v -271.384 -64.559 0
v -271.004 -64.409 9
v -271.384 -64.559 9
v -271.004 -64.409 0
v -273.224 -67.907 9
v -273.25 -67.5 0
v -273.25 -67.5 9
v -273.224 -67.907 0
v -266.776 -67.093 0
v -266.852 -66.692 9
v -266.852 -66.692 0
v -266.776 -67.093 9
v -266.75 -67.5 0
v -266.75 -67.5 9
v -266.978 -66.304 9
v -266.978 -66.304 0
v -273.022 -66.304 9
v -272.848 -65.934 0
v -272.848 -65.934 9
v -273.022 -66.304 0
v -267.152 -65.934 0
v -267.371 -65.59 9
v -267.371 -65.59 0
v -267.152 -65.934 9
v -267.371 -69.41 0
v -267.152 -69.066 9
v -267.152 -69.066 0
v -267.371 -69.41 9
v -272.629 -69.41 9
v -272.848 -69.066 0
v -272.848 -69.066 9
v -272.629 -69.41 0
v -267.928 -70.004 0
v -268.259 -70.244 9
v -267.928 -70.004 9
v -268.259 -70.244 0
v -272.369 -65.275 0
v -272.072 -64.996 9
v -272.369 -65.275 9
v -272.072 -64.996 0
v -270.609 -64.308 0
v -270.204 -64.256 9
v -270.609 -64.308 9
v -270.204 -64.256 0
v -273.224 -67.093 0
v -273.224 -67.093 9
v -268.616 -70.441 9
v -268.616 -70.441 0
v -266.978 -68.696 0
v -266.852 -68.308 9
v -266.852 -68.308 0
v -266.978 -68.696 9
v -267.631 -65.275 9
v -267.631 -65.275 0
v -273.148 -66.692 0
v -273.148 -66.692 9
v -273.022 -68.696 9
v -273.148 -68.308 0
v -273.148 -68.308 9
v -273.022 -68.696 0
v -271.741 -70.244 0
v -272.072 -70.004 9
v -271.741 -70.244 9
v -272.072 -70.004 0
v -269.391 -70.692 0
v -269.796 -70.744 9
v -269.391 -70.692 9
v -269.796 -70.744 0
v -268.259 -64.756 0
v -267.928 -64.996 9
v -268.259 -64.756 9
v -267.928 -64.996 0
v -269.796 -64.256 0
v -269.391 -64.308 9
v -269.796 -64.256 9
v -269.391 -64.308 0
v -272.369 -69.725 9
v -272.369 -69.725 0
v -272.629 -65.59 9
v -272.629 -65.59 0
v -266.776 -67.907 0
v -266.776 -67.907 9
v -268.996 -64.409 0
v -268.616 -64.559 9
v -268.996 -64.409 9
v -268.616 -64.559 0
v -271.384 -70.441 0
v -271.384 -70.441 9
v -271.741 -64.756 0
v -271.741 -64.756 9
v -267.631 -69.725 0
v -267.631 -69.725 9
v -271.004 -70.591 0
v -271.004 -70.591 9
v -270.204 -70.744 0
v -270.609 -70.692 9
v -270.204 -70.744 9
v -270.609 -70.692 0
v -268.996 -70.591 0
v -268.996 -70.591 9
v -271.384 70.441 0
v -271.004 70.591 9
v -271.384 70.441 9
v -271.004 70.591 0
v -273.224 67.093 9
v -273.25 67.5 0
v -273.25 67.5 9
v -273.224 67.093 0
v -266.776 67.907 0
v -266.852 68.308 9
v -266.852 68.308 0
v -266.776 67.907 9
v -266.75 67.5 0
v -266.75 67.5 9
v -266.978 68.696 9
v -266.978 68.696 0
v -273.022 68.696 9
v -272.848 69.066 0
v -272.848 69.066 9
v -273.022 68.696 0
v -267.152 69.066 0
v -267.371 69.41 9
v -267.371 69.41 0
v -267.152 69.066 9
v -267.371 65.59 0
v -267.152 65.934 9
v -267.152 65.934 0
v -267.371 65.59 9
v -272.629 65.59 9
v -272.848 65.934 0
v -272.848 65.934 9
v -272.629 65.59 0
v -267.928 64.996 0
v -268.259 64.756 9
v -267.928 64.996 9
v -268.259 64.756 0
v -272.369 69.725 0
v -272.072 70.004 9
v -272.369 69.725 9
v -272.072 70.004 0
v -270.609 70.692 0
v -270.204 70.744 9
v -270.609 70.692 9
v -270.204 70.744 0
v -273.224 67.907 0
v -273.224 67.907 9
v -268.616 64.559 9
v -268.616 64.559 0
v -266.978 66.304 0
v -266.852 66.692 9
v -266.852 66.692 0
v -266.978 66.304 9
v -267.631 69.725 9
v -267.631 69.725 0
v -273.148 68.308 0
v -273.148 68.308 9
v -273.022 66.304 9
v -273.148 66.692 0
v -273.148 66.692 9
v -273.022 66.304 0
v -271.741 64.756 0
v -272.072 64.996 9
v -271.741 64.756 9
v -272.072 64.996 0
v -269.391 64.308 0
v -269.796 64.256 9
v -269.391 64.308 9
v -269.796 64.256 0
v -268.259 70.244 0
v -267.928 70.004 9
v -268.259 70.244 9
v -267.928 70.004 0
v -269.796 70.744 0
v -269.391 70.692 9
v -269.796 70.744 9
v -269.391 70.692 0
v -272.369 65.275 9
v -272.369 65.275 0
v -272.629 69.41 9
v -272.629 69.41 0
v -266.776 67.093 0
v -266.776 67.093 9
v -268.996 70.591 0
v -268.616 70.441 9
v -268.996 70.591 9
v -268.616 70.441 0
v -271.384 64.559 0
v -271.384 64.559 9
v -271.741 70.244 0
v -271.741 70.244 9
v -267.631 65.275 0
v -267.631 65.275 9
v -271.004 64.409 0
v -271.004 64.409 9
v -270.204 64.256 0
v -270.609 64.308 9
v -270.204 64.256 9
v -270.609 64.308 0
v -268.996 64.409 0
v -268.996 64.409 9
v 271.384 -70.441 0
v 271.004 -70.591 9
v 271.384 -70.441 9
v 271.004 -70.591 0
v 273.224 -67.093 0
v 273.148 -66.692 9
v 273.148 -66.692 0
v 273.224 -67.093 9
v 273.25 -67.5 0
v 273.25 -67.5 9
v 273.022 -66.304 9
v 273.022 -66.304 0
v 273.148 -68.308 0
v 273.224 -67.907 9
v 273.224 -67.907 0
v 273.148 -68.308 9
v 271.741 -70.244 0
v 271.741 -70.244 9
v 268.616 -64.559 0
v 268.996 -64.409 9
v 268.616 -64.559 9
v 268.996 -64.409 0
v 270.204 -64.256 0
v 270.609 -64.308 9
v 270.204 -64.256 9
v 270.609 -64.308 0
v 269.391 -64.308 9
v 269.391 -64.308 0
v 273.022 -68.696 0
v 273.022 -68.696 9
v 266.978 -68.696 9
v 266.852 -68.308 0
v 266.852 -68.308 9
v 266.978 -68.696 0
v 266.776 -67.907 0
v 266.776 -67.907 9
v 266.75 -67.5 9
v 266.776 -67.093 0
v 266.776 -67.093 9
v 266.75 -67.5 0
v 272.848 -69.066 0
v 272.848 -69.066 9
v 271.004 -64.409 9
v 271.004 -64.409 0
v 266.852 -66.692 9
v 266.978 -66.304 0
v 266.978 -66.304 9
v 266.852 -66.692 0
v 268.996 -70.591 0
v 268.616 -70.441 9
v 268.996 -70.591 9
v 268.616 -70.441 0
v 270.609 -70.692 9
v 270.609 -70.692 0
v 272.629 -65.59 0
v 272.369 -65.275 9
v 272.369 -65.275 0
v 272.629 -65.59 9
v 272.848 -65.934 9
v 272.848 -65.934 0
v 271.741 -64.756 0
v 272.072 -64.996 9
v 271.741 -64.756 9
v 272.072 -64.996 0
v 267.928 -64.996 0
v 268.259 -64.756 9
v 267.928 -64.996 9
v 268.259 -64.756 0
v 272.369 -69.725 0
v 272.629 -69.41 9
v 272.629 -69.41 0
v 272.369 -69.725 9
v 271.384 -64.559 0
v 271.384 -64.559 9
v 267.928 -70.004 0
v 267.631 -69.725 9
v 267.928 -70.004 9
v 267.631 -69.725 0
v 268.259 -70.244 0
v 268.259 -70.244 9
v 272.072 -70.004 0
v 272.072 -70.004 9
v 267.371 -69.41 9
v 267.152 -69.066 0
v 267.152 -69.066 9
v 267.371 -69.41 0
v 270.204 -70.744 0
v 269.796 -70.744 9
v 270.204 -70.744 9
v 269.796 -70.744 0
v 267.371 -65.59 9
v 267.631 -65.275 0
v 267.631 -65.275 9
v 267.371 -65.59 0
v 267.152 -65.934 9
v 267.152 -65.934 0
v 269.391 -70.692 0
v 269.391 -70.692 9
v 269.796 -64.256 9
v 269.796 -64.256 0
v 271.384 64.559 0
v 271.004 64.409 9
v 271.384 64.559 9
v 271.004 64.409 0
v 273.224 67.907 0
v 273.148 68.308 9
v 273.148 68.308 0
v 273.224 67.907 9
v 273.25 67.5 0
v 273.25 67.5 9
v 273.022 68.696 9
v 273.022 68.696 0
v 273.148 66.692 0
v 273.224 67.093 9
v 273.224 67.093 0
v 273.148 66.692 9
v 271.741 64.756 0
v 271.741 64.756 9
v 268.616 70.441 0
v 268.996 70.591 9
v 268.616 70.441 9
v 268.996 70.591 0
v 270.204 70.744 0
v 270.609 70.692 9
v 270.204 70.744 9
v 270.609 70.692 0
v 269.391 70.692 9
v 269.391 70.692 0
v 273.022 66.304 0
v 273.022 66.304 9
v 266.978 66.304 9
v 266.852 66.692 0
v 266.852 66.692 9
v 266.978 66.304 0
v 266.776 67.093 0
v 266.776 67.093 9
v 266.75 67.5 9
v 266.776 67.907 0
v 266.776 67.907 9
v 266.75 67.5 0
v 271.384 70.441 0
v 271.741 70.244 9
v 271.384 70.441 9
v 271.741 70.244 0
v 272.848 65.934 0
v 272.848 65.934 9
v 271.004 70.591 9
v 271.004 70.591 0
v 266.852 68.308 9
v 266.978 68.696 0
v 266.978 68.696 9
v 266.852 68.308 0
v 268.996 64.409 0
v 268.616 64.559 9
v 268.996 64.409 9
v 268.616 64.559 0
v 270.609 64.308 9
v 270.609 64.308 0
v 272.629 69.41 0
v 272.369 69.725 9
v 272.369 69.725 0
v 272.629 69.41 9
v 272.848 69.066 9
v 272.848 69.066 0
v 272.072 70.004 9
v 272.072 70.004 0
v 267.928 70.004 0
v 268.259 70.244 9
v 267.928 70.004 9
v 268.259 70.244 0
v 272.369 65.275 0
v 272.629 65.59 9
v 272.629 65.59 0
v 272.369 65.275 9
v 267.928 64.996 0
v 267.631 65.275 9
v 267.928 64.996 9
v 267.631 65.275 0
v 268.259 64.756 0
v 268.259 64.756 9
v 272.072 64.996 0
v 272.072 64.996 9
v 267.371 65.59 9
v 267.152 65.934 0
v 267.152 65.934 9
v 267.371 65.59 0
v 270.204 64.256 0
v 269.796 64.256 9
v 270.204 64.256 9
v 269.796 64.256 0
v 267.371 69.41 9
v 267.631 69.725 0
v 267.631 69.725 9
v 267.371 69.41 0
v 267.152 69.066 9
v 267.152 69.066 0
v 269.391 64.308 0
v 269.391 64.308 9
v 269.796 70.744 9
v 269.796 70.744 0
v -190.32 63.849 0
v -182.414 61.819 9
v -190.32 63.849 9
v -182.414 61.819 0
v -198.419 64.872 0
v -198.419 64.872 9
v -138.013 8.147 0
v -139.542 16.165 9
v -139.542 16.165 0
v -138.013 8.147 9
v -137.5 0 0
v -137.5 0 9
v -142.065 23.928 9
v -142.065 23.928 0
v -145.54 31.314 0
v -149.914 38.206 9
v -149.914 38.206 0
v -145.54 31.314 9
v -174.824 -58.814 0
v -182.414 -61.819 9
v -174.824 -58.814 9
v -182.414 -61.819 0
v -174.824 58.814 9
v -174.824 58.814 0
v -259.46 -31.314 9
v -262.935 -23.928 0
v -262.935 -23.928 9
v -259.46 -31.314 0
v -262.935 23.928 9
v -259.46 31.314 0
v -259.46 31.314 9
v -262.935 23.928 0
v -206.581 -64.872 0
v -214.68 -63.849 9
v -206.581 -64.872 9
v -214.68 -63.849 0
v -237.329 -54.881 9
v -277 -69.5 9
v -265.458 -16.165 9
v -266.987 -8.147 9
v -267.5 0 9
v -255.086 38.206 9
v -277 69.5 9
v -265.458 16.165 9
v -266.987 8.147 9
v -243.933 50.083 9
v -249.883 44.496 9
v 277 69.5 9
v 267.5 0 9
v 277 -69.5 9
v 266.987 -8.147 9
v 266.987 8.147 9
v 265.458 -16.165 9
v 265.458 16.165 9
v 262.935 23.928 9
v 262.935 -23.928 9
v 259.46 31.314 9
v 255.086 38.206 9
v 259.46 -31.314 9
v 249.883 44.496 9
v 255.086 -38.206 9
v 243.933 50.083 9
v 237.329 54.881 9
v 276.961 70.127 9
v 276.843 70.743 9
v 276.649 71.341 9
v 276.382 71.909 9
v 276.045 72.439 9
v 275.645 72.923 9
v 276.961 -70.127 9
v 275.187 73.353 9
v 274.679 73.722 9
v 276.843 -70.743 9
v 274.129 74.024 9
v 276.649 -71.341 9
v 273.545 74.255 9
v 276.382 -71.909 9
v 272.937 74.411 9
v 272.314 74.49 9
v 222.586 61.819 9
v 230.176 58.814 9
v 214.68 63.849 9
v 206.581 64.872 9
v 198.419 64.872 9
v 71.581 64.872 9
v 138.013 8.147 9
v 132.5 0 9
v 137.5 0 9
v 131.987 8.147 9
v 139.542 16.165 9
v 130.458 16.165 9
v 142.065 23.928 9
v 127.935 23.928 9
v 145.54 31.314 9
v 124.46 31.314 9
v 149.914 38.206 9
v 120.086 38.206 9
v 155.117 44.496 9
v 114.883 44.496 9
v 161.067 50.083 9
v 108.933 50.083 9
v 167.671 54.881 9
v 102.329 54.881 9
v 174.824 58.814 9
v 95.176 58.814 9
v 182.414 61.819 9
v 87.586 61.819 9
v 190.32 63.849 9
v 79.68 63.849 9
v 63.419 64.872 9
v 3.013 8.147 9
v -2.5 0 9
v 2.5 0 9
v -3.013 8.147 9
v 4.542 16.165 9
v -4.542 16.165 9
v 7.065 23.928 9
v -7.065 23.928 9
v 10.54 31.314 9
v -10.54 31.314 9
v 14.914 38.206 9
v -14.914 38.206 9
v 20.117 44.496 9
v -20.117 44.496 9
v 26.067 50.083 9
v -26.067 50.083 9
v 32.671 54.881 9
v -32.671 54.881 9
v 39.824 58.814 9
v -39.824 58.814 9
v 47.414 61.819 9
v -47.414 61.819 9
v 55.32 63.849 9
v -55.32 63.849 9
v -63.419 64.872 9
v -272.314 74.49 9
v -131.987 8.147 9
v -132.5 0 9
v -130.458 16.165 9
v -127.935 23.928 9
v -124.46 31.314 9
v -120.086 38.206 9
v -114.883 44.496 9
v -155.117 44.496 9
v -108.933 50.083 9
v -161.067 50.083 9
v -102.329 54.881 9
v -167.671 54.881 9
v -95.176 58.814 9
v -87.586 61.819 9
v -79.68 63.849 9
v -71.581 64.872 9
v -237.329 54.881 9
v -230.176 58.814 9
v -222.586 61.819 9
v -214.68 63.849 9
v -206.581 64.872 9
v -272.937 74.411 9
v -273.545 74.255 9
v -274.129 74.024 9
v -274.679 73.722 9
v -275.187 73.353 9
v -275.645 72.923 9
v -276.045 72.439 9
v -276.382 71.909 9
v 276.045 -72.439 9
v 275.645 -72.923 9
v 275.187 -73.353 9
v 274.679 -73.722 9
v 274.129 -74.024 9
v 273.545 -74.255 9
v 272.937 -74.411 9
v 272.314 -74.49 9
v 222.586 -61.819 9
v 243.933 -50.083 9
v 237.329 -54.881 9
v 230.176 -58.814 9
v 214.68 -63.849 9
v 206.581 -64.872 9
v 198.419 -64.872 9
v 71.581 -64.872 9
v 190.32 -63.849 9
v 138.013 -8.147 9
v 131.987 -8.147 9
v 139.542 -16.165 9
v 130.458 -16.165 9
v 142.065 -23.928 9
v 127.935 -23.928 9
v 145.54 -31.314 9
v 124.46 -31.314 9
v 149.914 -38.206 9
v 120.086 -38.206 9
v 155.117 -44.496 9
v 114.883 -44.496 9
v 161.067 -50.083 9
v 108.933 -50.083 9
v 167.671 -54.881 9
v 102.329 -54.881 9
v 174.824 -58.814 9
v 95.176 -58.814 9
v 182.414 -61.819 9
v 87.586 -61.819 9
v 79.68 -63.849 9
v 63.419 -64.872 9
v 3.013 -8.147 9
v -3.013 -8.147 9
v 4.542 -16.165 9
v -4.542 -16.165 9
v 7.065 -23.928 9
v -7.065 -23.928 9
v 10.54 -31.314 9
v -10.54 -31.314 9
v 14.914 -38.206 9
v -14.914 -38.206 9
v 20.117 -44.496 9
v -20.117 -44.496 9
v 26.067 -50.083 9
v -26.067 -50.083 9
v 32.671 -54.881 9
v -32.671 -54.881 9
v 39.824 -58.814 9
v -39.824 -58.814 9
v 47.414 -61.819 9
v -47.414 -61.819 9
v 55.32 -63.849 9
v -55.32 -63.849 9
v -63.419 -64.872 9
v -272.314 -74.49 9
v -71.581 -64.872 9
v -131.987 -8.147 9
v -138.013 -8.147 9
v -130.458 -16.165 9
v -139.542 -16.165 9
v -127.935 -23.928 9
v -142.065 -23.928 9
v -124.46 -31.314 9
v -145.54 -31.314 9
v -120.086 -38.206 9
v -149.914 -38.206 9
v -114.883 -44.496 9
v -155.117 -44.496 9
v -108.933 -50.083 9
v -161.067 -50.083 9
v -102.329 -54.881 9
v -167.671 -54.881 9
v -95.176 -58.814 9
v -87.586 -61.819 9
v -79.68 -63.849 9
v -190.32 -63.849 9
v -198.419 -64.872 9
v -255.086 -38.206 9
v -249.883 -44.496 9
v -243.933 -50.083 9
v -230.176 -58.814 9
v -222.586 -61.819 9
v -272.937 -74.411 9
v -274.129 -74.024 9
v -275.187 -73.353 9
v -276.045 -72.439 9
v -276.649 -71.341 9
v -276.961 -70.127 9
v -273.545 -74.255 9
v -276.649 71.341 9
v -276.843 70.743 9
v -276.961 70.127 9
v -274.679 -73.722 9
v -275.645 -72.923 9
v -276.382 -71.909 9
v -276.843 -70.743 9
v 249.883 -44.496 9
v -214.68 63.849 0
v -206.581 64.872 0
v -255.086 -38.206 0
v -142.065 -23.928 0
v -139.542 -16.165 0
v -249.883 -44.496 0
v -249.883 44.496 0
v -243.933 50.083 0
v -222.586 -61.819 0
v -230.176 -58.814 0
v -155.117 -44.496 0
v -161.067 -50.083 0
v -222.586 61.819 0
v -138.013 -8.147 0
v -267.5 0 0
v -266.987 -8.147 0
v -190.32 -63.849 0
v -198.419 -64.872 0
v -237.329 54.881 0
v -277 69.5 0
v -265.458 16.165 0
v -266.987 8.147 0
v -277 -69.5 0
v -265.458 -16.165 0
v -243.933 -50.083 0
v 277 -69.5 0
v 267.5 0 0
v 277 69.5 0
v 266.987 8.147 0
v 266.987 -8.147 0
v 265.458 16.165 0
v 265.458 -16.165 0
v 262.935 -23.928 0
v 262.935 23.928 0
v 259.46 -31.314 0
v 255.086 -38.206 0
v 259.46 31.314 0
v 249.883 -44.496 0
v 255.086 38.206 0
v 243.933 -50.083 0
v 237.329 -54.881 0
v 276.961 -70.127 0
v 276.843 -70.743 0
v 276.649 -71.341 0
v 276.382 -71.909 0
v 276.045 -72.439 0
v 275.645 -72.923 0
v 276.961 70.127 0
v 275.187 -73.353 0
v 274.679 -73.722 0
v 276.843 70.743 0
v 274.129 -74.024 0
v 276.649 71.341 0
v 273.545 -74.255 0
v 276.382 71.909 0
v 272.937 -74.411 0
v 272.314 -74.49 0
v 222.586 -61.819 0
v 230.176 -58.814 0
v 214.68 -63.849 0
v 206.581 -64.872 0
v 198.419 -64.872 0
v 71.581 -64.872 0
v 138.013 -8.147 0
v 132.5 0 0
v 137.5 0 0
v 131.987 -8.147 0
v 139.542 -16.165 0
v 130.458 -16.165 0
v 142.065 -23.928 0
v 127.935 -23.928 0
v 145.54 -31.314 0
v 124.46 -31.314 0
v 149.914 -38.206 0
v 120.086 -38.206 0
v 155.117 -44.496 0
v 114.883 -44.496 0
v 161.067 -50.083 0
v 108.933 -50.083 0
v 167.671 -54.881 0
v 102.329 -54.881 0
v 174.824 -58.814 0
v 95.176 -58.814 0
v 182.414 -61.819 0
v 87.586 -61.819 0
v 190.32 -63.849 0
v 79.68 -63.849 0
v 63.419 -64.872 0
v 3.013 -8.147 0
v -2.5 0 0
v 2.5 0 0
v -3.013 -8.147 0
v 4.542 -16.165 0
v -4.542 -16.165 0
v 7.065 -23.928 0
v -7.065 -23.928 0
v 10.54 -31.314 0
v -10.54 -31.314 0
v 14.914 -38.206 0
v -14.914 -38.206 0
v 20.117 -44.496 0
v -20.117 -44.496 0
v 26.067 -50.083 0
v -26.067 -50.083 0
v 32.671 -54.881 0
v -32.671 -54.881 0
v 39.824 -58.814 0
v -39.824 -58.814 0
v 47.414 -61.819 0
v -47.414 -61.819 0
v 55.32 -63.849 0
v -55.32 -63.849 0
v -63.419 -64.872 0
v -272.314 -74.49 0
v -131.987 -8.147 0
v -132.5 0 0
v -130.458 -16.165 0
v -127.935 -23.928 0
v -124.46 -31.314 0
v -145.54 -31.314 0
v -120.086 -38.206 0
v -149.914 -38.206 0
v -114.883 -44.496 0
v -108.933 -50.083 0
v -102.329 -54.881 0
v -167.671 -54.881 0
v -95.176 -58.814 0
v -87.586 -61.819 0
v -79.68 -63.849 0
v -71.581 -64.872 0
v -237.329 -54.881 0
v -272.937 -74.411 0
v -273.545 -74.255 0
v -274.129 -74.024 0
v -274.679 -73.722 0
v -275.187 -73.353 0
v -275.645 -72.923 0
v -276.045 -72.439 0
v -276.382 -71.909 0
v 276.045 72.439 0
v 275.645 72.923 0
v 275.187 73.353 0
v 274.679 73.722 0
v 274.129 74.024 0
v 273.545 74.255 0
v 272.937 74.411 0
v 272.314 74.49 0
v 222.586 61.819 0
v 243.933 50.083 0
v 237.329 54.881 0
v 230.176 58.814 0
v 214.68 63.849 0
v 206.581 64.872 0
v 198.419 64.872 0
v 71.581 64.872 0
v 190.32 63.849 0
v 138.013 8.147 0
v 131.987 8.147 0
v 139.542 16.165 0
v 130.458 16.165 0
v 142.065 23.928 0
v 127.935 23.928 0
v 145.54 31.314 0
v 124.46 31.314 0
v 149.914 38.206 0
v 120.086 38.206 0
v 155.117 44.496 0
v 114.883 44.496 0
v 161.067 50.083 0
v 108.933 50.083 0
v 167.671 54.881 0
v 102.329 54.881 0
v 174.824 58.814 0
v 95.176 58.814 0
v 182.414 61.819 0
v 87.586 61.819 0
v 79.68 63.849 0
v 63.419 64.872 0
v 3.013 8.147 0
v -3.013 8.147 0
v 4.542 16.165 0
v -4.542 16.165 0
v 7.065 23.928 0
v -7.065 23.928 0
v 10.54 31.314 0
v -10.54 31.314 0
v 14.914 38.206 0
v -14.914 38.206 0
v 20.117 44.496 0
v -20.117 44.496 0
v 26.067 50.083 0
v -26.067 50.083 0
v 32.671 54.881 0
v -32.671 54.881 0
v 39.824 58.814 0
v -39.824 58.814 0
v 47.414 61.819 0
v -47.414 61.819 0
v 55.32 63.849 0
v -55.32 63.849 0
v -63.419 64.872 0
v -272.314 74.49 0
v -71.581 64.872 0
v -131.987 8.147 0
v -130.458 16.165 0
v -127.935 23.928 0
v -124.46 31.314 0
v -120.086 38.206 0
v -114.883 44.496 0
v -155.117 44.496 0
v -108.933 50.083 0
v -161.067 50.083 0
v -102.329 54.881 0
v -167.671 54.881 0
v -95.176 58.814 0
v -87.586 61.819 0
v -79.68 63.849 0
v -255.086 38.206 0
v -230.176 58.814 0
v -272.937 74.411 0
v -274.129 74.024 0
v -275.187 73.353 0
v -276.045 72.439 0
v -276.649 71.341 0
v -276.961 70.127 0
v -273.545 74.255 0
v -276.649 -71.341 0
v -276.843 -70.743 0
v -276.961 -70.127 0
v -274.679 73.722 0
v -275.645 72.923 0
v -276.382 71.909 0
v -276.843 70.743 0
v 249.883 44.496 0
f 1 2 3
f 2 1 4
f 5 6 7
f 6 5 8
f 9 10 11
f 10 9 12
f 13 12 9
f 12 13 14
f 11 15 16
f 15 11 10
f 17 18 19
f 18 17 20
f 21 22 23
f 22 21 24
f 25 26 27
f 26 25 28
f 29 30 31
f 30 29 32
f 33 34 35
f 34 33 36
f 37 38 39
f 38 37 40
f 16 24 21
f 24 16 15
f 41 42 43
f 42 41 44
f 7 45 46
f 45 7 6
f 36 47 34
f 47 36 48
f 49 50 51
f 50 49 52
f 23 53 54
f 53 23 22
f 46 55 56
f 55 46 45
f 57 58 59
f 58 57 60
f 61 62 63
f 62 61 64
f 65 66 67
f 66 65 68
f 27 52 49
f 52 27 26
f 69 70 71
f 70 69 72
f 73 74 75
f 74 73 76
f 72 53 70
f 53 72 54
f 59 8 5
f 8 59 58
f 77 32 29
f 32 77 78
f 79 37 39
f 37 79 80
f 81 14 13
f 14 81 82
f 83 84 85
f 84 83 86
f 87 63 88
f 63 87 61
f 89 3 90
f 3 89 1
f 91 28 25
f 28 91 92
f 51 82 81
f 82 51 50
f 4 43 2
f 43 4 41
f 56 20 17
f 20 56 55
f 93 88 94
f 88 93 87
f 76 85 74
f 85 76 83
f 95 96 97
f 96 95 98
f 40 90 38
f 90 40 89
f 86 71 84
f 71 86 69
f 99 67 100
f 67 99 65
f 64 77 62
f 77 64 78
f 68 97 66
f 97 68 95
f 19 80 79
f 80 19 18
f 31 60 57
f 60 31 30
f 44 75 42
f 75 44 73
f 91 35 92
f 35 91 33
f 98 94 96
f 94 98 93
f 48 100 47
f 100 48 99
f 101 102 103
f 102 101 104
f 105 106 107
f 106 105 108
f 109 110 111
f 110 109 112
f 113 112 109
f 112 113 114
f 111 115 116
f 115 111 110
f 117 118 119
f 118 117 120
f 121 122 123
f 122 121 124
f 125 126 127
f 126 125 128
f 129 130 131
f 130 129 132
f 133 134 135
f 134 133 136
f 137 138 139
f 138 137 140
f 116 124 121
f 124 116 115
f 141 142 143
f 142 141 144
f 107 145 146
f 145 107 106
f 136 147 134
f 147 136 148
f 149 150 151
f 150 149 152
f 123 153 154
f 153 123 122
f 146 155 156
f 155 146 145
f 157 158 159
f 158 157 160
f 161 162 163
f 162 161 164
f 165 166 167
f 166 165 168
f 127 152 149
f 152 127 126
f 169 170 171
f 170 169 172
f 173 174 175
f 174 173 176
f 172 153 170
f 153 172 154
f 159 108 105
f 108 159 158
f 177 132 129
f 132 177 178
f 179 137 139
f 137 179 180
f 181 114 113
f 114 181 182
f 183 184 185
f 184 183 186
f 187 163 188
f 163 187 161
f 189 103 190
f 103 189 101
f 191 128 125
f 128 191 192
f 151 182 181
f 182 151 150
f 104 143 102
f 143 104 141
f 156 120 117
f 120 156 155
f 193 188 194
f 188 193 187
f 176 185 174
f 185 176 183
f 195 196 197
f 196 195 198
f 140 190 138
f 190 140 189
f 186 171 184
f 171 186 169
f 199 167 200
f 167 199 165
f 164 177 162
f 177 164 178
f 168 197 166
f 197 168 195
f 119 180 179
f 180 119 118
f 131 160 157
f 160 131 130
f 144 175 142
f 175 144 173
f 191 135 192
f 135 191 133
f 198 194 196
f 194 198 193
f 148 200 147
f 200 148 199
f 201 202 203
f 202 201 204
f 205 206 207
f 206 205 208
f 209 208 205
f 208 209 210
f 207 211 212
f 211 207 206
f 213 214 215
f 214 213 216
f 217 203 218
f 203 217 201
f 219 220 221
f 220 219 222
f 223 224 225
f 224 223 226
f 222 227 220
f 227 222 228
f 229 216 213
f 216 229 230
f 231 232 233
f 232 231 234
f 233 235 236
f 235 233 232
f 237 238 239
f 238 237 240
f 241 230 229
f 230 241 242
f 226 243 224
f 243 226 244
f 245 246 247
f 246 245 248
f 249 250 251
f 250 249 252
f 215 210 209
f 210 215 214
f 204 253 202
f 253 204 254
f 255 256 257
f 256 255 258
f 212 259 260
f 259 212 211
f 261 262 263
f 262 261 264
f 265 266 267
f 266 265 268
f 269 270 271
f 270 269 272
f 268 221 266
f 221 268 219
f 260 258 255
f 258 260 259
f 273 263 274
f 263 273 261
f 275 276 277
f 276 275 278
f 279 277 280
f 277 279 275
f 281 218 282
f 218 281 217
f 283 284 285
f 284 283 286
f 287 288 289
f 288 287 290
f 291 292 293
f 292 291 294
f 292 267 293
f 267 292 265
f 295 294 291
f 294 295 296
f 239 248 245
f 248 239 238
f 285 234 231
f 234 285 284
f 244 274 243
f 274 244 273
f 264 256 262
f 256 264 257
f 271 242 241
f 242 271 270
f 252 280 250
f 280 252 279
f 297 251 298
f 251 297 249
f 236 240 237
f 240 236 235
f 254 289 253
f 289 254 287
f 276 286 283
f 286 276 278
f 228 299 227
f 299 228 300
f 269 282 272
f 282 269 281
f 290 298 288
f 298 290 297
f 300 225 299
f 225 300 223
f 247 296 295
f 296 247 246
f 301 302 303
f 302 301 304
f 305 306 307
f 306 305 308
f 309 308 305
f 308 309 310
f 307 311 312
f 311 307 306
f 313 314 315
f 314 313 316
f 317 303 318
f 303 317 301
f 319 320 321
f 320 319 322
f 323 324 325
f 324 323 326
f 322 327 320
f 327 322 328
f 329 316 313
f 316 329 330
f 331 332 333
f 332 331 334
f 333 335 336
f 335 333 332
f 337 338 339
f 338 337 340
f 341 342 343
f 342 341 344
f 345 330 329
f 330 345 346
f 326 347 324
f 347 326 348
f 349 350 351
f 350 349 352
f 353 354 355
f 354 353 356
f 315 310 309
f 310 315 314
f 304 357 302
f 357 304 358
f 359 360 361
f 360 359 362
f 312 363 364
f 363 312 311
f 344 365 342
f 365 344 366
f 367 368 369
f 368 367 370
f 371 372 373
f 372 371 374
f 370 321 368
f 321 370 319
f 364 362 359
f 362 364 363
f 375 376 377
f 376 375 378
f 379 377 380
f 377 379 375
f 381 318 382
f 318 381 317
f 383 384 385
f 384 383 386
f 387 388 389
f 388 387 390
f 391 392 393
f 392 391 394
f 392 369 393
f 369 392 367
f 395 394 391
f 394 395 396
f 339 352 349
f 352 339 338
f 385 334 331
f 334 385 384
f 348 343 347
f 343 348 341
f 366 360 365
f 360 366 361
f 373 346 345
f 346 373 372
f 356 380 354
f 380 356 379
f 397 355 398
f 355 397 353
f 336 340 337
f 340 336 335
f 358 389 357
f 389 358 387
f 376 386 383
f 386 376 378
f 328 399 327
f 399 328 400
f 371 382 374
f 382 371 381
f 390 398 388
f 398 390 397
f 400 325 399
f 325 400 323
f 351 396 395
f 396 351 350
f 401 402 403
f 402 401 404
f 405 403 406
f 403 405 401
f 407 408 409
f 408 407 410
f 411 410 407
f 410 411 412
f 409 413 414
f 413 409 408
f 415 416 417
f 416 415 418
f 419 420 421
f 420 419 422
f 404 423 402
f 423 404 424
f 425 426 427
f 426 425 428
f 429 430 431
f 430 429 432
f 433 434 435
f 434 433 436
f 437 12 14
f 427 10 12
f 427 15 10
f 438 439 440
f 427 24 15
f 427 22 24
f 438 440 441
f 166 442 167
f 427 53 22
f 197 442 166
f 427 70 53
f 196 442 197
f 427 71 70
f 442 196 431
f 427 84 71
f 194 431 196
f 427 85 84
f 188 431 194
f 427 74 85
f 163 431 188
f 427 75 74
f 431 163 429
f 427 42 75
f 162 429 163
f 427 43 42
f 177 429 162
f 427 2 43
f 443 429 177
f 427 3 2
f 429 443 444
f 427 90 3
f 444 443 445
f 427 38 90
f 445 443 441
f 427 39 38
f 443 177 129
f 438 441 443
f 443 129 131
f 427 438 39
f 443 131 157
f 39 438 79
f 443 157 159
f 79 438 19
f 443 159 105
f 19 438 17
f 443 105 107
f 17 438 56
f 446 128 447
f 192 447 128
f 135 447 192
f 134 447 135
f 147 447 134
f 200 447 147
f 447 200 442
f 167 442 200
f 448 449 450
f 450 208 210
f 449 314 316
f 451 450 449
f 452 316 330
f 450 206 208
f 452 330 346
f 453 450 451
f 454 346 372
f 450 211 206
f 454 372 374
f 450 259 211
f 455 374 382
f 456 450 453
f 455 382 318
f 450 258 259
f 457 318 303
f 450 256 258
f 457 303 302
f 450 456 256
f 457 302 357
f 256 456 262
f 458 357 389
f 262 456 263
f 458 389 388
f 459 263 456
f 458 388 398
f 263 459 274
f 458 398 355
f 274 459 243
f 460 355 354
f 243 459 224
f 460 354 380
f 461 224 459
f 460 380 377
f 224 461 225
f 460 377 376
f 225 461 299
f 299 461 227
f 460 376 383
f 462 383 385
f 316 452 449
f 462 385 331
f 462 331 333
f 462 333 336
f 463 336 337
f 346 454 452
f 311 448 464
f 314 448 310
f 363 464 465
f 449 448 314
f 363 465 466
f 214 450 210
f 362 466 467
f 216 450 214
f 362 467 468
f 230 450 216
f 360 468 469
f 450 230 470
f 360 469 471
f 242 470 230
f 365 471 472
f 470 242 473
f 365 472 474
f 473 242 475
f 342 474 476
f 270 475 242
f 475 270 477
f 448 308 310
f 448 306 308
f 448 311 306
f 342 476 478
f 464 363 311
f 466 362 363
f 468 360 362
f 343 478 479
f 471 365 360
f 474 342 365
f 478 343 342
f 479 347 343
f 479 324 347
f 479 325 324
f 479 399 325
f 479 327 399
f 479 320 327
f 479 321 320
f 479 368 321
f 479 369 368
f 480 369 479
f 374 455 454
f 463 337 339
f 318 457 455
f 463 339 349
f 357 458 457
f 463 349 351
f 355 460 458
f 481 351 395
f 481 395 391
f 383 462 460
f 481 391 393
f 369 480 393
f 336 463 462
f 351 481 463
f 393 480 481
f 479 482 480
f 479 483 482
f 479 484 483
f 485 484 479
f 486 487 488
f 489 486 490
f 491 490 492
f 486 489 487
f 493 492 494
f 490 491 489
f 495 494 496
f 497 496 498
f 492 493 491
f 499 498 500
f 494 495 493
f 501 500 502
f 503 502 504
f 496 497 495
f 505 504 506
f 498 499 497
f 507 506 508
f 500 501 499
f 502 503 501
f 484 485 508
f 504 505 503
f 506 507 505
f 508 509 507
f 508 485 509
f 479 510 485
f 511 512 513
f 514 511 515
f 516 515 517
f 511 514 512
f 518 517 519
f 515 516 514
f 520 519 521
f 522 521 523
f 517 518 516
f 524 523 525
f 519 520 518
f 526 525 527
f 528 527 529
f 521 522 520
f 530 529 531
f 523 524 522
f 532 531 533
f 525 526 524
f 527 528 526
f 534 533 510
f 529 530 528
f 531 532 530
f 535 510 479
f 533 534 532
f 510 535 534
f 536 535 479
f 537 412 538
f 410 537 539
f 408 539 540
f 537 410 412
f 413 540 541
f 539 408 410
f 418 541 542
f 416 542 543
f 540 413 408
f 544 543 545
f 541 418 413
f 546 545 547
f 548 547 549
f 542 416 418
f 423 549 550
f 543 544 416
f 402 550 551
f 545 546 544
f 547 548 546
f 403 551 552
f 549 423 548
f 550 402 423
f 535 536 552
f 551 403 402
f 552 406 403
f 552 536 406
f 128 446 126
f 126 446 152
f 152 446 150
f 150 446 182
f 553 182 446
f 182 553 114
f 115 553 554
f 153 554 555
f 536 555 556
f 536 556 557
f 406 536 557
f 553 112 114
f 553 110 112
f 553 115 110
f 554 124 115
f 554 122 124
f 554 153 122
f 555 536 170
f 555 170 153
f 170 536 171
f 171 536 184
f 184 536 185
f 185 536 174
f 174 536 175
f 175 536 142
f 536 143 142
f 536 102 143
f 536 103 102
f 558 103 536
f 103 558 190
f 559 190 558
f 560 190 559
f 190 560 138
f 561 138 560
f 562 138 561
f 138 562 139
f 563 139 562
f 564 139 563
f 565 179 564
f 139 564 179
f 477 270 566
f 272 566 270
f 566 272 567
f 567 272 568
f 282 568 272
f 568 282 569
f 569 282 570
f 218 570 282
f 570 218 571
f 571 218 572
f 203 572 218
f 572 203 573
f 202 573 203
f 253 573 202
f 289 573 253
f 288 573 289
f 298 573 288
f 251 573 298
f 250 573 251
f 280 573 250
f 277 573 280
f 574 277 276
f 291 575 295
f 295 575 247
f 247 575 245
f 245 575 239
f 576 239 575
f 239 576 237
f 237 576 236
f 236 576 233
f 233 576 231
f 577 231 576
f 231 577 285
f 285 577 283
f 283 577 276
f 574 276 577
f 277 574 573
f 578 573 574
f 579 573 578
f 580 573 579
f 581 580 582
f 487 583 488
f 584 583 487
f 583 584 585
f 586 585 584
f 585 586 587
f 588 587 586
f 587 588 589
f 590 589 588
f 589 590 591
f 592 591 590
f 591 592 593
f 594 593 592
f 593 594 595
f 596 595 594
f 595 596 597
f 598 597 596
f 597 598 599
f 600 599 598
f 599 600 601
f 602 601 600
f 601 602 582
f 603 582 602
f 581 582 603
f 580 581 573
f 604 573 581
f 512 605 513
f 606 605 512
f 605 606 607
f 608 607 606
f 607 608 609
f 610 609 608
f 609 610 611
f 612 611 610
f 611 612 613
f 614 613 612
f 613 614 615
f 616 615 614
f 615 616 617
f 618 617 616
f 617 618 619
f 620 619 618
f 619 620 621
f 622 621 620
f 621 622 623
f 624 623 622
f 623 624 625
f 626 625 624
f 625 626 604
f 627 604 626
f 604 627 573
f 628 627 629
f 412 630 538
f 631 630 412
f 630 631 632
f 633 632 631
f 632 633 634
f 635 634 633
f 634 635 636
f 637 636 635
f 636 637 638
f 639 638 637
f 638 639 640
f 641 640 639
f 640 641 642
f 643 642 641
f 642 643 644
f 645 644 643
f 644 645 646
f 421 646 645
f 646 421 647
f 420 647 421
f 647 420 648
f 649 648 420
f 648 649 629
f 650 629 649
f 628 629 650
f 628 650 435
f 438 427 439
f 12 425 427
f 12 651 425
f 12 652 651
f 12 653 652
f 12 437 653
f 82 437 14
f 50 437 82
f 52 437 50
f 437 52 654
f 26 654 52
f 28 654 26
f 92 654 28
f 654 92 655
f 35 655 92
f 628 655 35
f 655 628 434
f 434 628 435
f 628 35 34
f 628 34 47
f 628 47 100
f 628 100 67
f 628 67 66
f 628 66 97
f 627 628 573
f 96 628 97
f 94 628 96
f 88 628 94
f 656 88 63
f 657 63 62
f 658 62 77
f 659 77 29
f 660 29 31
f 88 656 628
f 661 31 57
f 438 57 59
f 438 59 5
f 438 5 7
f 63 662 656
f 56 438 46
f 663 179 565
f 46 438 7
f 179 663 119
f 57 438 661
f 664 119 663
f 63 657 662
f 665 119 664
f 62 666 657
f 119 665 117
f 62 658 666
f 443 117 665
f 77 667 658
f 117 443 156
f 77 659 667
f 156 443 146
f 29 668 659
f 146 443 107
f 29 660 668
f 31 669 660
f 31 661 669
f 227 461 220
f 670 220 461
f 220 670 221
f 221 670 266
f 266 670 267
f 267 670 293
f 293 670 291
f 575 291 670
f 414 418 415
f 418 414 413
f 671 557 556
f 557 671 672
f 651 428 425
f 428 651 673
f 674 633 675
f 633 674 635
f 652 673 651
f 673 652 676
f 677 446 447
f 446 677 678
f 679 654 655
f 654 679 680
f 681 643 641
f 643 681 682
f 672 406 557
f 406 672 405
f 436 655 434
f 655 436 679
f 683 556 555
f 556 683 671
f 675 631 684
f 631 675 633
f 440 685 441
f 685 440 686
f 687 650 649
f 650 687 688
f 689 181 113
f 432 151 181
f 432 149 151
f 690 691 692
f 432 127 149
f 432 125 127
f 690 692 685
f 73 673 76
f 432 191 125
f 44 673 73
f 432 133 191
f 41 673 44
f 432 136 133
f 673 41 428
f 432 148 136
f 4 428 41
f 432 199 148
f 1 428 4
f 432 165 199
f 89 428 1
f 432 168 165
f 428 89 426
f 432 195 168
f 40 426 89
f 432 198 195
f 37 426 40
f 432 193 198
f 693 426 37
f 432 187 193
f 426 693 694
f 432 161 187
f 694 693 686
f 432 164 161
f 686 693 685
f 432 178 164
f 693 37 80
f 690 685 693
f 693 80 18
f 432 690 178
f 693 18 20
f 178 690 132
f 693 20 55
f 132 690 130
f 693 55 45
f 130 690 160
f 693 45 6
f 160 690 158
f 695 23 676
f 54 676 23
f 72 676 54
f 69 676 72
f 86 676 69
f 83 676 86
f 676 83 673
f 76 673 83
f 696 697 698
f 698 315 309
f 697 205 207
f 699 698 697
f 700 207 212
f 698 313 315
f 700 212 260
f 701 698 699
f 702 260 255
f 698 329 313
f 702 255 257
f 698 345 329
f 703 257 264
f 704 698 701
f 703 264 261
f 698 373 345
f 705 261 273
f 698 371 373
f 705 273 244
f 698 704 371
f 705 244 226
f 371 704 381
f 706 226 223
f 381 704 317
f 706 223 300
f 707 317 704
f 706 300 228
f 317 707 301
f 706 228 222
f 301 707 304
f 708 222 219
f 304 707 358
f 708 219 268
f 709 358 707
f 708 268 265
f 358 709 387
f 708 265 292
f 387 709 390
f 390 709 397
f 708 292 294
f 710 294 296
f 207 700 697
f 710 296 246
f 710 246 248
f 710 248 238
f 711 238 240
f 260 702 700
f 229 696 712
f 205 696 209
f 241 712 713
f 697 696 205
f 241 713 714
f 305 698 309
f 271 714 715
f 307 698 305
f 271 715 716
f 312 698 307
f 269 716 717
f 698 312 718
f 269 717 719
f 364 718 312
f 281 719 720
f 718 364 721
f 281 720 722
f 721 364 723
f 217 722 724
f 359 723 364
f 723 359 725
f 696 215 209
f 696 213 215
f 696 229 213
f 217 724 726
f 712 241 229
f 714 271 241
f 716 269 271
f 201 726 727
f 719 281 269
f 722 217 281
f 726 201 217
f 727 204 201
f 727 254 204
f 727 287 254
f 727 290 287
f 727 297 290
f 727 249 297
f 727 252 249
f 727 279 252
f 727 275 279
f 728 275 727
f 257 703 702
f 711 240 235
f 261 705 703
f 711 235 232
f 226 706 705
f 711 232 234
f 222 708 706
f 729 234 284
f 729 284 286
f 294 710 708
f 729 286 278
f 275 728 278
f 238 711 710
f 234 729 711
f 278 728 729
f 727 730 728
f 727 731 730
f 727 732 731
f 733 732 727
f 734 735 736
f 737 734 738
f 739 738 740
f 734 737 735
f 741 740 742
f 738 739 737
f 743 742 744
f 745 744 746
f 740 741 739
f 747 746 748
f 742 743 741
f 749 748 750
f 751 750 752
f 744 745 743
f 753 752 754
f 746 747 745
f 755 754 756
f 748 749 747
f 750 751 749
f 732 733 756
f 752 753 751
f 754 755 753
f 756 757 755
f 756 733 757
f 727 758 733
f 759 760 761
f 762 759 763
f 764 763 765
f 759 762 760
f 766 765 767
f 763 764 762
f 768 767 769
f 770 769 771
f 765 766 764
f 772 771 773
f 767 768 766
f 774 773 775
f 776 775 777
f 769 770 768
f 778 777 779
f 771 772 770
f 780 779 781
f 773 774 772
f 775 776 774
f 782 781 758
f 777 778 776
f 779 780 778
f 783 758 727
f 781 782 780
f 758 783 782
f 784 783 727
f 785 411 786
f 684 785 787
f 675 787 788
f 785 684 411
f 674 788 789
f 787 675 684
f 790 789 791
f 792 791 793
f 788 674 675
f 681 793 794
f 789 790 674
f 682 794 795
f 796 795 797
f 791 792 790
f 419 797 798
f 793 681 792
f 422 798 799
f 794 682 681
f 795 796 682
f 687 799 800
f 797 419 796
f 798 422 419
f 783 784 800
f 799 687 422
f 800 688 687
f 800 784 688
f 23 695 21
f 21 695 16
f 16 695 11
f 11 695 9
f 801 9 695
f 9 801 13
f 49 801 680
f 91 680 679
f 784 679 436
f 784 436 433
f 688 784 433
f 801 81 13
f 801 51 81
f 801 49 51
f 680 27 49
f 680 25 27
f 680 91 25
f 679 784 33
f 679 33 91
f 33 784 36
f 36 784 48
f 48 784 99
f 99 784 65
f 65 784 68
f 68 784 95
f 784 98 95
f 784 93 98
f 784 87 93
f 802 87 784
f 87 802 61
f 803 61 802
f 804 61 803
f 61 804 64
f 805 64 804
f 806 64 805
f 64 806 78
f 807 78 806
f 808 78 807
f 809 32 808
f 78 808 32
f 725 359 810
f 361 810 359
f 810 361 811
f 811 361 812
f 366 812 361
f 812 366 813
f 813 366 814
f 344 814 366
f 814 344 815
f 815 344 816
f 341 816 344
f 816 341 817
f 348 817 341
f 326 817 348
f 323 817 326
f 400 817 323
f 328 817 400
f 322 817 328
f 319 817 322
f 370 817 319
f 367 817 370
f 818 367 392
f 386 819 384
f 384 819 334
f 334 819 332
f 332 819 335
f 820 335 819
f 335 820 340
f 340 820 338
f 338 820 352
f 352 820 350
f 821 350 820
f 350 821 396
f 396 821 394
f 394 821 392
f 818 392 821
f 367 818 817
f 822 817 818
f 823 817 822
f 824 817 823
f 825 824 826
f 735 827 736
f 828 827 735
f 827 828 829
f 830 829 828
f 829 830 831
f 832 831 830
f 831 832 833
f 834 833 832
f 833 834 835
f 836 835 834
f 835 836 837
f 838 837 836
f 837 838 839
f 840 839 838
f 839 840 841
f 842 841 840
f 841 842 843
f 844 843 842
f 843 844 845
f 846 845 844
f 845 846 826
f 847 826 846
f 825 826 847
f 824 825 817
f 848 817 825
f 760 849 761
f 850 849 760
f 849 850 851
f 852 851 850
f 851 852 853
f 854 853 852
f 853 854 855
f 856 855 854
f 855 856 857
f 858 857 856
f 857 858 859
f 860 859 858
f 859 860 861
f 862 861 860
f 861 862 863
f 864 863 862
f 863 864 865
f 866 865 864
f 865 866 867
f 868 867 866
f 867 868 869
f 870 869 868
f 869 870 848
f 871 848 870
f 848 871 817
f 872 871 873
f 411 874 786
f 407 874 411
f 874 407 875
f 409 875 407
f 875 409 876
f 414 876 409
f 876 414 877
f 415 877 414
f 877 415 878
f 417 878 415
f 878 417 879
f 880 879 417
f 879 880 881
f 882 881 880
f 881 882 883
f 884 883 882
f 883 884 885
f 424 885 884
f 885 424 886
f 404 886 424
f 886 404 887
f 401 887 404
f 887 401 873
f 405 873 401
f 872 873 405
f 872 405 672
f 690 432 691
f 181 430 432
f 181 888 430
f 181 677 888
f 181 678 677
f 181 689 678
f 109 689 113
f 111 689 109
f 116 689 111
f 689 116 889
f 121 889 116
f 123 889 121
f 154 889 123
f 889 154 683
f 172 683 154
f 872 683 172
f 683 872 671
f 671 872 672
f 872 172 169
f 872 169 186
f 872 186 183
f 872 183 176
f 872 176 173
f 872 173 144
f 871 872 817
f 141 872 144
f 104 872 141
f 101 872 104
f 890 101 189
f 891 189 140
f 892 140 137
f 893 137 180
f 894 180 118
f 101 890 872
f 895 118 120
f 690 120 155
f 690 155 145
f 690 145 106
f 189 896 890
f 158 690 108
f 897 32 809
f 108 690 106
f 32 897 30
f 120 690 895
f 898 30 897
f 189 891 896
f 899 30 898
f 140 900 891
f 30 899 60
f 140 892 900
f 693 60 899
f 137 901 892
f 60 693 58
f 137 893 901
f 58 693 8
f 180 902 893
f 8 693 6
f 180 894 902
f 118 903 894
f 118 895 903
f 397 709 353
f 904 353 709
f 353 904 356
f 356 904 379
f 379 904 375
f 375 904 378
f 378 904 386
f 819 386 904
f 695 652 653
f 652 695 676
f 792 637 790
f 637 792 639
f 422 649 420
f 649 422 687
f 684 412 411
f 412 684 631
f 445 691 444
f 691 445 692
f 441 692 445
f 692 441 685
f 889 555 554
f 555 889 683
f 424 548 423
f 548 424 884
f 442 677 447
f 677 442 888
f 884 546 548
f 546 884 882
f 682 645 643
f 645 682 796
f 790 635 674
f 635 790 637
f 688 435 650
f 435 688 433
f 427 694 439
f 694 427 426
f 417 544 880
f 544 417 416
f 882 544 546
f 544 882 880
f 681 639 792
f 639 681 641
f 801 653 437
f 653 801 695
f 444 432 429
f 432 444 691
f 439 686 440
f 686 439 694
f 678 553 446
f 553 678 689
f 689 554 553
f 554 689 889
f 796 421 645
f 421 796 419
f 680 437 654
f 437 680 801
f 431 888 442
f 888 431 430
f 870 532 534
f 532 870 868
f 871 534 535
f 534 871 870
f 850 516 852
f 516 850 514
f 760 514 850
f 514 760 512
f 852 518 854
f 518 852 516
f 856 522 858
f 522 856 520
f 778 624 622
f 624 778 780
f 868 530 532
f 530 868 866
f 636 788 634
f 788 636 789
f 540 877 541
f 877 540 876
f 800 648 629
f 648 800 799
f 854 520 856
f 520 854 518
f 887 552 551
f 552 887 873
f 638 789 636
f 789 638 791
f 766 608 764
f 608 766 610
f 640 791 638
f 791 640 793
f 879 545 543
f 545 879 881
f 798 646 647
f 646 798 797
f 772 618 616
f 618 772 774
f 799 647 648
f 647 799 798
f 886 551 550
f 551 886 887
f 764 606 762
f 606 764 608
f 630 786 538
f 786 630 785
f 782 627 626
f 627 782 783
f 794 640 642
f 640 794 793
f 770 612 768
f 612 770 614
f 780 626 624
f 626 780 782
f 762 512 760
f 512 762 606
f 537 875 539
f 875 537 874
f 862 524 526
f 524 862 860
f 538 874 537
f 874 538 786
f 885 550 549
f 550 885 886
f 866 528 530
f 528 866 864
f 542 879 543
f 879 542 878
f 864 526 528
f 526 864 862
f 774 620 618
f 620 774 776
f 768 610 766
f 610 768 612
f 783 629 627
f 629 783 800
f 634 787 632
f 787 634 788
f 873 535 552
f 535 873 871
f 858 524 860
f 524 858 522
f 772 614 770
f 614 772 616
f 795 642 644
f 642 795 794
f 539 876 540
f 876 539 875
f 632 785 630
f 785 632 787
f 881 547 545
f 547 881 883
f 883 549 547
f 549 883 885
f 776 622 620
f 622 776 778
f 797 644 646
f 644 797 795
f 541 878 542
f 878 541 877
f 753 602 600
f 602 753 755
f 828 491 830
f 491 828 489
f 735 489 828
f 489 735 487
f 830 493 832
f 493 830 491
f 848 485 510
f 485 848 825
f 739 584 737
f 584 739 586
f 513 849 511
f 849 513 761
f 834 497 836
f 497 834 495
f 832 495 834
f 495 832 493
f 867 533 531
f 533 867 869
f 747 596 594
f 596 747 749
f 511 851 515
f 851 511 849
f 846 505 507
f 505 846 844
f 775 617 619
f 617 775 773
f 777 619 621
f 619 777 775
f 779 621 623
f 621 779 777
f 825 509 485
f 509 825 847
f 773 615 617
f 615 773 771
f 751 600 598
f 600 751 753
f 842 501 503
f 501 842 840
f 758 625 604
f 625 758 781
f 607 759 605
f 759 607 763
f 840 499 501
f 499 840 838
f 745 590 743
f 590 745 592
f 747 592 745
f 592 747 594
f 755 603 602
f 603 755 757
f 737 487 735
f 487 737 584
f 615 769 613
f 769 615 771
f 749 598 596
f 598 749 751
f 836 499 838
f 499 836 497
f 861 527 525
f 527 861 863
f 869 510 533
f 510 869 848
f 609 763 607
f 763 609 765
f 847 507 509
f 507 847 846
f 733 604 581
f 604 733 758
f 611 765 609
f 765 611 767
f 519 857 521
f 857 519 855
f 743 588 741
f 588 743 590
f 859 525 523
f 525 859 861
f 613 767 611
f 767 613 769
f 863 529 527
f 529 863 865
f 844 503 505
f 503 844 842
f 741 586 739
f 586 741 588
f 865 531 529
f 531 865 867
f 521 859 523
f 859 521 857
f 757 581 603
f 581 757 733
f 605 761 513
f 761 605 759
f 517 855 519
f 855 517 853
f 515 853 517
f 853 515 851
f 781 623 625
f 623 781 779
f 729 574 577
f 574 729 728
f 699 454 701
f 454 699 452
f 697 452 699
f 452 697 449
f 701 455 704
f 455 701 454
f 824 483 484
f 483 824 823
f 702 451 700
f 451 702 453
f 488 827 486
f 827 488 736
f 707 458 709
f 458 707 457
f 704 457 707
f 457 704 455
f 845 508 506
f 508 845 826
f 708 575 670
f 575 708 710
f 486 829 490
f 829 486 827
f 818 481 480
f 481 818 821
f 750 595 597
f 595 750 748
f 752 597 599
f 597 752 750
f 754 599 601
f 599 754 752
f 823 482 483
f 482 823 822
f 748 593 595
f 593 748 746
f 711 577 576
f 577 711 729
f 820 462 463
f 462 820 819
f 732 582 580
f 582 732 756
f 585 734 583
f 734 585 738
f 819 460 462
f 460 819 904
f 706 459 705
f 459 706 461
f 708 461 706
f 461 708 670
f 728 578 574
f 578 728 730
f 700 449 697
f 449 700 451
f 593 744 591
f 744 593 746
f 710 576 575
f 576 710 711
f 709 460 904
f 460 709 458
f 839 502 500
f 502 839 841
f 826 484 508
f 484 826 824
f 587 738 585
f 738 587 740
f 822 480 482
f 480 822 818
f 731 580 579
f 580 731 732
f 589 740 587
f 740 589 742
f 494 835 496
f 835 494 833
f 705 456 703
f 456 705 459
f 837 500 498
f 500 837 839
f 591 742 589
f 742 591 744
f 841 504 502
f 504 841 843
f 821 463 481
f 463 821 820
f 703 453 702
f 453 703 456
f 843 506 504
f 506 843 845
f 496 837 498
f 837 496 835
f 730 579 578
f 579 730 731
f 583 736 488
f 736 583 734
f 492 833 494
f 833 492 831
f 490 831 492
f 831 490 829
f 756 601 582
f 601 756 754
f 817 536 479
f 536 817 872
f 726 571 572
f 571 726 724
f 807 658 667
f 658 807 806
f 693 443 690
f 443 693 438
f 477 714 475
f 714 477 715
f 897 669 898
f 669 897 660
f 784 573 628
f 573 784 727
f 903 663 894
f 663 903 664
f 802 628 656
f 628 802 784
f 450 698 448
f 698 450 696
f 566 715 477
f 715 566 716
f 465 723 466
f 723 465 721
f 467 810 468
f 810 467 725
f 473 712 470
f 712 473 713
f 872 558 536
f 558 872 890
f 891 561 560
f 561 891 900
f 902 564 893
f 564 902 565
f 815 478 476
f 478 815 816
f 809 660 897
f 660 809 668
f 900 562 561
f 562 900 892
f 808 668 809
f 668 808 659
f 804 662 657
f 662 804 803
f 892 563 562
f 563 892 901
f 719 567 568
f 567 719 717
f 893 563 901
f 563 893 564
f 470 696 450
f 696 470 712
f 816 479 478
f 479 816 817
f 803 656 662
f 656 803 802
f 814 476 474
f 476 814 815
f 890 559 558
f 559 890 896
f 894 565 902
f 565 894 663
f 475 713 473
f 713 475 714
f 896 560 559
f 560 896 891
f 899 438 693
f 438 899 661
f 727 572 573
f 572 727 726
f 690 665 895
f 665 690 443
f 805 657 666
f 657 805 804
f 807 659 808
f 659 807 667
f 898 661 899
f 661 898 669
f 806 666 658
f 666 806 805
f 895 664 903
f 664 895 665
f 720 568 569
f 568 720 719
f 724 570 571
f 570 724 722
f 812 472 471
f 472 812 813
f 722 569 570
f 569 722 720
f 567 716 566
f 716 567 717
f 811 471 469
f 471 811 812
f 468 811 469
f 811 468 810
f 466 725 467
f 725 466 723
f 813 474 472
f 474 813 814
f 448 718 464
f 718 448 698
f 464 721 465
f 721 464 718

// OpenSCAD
$fn = 50;

difference() {
	union() {
		hull() {
			translate(v = [-272.0, 69.5, 0]) {
				cylinder(h = 9, r = 5);
			}
			translate(v = [272.0, 69.5, 0]) {
				cylinder(h = 9, r = 5);
			}
			translate(v = [-272.0, -69.5, 0]) {
				cylinder(h = 9, r = 5);
			}
			translate(v = [272.0, -69.5, 0]) {
				cylinder(h = 9, r = 5);
			}
		}
	}
	union() {
		translate(v = [-270.0, -67.5, -100.0]) {
			cylinder(h = 200, r = 3.25);
		}
		translate(v = [-270.0, 67.5, -100.0]) {
			cylinder(h = 200, r = 3.25);
		}
		translate(v = [270.0, -67.5, -100.0]) {
			cylinder(h = 200, r = 3.25);
		}
		translate(v = [270.0, 67.5, -100.0]) {
			cylinder(h = 200, r = 3.25);
		}
		translate(v = [-270.0, -67.5, -100.0]) {
			cylinder(h = 200, r = 1.8);
		}
		translate(v = [-270.0, 67.5, -100.0]) {
			cylinder(h = 200, r = 1.8);
		}
		translate(v = [270.0, -67.5, -100.0]) {
			cylinder(h = 200, r = 1.8);
		}
		translate(v = [270.0, 67.5, -100.0]) {
			cylinder(h = 200, r = 1.8);
		}
		translate(v = [-202.5, 0, 0.0]) {
			cylinder(h = 9, r = 65.0);
		}
		translate(v = [-67.5, 0, 0.0]) {
			cylinder(h = 9, r = 65.0);
		}
		translate(v = [67.5, 0, 0.0]) {
			cylinder(h = 9, r = 65.0);
		}
		translate(v = [202.5, 0, 0.0]) {
			cylinder(h = 9, r = 65.0);
		}
	}
}
